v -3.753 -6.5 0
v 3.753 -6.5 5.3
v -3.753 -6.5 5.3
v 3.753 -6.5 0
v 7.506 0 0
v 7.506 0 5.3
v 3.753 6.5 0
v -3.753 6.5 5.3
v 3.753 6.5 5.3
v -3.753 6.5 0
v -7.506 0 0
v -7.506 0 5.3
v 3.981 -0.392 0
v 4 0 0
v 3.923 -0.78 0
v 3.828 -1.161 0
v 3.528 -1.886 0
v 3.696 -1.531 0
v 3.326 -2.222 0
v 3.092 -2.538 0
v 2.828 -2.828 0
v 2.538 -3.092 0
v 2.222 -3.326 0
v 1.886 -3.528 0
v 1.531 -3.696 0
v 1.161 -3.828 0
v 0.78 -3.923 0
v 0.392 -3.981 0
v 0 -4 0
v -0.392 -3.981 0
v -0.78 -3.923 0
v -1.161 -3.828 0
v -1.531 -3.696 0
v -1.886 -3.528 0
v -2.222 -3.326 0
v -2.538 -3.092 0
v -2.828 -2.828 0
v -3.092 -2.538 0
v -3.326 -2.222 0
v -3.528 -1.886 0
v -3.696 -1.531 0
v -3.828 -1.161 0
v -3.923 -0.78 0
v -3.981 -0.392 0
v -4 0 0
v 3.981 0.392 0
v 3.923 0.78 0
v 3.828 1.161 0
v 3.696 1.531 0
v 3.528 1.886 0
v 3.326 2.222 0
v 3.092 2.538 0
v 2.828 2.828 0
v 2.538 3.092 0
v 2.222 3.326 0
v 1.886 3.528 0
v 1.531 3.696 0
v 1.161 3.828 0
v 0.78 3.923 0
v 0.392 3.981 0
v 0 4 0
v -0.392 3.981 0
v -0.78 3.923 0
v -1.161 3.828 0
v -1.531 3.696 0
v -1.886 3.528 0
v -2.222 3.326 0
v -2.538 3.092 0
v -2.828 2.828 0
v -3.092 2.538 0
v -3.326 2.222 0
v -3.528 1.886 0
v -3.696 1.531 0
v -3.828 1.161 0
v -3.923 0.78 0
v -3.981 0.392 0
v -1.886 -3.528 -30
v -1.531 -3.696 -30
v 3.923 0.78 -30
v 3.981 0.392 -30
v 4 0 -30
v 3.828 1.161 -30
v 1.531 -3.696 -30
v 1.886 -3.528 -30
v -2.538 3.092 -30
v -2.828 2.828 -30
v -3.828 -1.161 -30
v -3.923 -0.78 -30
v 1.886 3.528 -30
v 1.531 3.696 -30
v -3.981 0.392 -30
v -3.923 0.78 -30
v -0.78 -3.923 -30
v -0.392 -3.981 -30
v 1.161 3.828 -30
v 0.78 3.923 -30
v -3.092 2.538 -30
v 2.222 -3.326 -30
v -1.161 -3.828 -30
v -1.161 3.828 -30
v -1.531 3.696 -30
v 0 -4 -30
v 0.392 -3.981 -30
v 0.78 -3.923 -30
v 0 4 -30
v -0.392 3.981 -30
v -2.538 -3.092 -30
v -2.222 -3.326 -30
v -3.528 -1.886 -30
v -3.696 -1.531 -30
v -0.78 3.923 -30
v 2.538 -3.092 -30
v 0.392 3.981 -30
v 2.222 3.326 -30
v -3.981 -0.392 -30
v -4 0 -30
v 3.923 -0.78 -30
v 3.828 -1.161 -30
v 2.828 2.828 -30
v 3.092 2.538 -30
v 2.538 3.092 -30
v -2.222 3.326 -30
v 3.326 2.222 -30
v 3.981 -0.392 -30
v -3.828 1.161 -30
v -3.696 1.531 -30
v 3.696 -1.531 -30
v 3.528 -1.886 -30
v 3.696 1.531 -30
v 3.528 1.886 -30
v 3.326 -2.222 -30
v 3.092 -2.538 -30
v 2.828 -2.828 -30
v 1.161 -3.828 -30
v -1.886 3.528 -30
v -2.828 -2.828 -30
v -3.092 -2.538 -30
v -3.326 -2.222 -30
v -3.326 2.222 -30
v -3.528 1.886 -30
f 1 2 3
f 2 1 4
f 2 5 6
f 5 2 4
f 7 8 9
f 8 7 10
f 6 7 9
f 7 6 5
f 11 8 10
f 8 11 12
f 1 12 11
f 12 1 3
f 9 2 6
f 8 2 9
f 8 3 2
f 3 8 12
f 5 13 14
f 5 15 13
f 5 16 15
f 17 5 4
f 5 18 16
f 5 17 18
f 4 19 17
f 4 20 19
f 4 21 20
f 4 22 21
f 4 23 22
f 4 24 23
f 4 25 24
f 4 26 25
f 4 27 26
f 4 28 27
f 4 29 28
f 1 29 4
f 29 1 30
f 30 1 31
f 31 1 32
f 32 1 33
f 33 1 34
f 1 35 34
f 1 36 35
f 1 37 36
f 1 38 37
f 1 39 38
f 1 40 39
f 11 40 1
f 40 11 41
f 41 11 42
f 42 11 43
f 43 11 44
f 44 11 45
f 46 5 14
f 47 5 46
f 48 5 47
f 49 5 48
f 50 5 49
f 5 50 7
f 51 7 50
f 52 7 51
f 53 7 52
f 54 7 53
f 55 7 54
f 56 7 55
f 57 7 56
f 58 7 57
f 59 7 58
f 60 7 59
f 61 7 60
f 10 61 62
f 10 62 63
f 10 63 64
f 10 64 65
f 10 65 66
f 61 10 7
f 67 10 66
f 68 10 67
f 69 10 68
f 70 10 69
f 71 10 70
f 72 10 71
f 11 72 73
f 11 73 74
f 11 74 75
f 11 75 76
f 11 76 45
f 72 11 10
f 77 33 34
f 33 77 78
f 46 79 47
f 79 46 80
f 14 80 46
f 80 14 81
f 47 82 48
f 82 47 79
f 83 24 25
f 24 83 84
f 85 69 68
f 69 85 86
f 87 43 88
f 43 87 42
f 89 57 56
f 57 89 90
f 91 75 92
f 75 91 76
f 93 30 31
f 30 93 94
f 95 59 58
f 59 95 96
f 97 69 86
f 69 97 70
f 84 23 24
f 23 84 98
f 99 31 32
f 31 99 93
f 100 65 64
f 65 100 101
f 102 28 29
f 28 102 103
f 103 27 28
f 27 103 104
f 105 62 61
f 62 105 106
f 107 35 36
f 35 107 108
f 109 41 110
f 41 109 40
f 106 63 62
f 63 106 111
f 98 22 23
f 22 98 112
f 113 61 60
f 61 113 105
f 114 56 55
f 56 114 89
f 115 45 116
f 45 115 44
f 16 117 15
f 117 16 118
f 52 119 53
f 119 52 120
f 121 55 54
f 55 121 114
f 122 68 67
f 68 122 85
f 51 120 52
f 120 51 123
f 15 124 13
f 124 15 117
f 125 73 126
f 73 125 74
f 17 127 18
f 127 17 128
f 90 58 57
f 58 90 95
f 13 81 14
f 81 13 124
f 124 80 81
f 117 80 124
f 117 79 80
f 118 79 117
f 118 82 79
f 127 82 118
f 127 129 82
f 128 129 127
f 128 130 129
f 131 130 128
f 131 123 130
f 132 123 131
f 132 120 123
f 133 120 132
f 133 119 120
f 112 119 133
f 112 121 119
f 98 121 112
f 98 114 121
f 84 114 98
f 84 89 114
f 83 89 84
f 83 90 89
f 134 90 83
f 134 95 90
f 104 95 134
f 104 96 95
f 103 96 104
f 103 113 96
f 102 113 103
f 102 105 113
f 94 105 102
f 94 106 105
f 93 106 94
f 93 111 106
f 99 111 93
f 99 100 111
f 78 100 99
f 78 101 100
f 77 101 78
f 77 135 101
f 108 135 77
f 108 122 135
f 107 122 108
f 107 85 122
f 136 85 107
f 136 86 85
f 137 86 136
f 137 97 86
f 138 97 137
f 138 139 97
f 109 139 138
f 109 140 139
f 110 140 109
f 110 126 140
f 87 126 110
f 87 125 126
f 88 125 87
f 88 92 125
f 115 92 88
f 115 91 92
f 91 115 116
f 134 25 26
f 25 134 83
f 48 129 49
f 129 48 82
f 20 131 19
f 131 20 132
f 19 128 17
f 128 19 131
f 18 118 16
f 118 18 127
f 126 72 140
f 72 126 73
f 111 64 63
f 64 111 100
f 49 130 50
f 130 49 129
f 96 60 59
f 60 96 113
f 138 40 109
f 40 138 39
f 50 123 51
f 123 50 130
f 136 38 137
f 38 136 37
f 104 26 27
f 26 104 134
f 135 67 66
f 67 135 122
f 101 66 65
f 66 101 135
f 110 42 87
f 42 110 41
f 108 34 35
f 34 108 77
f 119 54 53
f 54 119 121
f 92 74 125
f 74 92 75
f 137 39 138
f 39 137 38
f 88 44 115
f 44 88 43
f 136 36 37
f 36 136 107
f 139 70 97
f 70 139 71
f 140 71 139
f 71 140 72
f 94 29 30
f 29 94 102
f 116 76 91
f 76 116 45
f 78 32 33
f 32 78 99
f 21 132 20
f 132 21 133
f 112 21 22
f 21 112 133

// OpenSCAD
$fn = 6;

across_flats = 13;
head_height = 5.3;
shank_diameter = 8;
shank_length = 30;

hex_radius = across_flats / sqrt(3);

union() {
    // Hexagonal head, with its bottom face at z = 0
    cylinder(h = head_height, r = hex_radius);

    // Cylindrical shank extending in the negative Z direction
    translate([0, 0, -shank_length])
        cylinder(h = shank_length, d = shank_diameter, $fn = 64);
}
